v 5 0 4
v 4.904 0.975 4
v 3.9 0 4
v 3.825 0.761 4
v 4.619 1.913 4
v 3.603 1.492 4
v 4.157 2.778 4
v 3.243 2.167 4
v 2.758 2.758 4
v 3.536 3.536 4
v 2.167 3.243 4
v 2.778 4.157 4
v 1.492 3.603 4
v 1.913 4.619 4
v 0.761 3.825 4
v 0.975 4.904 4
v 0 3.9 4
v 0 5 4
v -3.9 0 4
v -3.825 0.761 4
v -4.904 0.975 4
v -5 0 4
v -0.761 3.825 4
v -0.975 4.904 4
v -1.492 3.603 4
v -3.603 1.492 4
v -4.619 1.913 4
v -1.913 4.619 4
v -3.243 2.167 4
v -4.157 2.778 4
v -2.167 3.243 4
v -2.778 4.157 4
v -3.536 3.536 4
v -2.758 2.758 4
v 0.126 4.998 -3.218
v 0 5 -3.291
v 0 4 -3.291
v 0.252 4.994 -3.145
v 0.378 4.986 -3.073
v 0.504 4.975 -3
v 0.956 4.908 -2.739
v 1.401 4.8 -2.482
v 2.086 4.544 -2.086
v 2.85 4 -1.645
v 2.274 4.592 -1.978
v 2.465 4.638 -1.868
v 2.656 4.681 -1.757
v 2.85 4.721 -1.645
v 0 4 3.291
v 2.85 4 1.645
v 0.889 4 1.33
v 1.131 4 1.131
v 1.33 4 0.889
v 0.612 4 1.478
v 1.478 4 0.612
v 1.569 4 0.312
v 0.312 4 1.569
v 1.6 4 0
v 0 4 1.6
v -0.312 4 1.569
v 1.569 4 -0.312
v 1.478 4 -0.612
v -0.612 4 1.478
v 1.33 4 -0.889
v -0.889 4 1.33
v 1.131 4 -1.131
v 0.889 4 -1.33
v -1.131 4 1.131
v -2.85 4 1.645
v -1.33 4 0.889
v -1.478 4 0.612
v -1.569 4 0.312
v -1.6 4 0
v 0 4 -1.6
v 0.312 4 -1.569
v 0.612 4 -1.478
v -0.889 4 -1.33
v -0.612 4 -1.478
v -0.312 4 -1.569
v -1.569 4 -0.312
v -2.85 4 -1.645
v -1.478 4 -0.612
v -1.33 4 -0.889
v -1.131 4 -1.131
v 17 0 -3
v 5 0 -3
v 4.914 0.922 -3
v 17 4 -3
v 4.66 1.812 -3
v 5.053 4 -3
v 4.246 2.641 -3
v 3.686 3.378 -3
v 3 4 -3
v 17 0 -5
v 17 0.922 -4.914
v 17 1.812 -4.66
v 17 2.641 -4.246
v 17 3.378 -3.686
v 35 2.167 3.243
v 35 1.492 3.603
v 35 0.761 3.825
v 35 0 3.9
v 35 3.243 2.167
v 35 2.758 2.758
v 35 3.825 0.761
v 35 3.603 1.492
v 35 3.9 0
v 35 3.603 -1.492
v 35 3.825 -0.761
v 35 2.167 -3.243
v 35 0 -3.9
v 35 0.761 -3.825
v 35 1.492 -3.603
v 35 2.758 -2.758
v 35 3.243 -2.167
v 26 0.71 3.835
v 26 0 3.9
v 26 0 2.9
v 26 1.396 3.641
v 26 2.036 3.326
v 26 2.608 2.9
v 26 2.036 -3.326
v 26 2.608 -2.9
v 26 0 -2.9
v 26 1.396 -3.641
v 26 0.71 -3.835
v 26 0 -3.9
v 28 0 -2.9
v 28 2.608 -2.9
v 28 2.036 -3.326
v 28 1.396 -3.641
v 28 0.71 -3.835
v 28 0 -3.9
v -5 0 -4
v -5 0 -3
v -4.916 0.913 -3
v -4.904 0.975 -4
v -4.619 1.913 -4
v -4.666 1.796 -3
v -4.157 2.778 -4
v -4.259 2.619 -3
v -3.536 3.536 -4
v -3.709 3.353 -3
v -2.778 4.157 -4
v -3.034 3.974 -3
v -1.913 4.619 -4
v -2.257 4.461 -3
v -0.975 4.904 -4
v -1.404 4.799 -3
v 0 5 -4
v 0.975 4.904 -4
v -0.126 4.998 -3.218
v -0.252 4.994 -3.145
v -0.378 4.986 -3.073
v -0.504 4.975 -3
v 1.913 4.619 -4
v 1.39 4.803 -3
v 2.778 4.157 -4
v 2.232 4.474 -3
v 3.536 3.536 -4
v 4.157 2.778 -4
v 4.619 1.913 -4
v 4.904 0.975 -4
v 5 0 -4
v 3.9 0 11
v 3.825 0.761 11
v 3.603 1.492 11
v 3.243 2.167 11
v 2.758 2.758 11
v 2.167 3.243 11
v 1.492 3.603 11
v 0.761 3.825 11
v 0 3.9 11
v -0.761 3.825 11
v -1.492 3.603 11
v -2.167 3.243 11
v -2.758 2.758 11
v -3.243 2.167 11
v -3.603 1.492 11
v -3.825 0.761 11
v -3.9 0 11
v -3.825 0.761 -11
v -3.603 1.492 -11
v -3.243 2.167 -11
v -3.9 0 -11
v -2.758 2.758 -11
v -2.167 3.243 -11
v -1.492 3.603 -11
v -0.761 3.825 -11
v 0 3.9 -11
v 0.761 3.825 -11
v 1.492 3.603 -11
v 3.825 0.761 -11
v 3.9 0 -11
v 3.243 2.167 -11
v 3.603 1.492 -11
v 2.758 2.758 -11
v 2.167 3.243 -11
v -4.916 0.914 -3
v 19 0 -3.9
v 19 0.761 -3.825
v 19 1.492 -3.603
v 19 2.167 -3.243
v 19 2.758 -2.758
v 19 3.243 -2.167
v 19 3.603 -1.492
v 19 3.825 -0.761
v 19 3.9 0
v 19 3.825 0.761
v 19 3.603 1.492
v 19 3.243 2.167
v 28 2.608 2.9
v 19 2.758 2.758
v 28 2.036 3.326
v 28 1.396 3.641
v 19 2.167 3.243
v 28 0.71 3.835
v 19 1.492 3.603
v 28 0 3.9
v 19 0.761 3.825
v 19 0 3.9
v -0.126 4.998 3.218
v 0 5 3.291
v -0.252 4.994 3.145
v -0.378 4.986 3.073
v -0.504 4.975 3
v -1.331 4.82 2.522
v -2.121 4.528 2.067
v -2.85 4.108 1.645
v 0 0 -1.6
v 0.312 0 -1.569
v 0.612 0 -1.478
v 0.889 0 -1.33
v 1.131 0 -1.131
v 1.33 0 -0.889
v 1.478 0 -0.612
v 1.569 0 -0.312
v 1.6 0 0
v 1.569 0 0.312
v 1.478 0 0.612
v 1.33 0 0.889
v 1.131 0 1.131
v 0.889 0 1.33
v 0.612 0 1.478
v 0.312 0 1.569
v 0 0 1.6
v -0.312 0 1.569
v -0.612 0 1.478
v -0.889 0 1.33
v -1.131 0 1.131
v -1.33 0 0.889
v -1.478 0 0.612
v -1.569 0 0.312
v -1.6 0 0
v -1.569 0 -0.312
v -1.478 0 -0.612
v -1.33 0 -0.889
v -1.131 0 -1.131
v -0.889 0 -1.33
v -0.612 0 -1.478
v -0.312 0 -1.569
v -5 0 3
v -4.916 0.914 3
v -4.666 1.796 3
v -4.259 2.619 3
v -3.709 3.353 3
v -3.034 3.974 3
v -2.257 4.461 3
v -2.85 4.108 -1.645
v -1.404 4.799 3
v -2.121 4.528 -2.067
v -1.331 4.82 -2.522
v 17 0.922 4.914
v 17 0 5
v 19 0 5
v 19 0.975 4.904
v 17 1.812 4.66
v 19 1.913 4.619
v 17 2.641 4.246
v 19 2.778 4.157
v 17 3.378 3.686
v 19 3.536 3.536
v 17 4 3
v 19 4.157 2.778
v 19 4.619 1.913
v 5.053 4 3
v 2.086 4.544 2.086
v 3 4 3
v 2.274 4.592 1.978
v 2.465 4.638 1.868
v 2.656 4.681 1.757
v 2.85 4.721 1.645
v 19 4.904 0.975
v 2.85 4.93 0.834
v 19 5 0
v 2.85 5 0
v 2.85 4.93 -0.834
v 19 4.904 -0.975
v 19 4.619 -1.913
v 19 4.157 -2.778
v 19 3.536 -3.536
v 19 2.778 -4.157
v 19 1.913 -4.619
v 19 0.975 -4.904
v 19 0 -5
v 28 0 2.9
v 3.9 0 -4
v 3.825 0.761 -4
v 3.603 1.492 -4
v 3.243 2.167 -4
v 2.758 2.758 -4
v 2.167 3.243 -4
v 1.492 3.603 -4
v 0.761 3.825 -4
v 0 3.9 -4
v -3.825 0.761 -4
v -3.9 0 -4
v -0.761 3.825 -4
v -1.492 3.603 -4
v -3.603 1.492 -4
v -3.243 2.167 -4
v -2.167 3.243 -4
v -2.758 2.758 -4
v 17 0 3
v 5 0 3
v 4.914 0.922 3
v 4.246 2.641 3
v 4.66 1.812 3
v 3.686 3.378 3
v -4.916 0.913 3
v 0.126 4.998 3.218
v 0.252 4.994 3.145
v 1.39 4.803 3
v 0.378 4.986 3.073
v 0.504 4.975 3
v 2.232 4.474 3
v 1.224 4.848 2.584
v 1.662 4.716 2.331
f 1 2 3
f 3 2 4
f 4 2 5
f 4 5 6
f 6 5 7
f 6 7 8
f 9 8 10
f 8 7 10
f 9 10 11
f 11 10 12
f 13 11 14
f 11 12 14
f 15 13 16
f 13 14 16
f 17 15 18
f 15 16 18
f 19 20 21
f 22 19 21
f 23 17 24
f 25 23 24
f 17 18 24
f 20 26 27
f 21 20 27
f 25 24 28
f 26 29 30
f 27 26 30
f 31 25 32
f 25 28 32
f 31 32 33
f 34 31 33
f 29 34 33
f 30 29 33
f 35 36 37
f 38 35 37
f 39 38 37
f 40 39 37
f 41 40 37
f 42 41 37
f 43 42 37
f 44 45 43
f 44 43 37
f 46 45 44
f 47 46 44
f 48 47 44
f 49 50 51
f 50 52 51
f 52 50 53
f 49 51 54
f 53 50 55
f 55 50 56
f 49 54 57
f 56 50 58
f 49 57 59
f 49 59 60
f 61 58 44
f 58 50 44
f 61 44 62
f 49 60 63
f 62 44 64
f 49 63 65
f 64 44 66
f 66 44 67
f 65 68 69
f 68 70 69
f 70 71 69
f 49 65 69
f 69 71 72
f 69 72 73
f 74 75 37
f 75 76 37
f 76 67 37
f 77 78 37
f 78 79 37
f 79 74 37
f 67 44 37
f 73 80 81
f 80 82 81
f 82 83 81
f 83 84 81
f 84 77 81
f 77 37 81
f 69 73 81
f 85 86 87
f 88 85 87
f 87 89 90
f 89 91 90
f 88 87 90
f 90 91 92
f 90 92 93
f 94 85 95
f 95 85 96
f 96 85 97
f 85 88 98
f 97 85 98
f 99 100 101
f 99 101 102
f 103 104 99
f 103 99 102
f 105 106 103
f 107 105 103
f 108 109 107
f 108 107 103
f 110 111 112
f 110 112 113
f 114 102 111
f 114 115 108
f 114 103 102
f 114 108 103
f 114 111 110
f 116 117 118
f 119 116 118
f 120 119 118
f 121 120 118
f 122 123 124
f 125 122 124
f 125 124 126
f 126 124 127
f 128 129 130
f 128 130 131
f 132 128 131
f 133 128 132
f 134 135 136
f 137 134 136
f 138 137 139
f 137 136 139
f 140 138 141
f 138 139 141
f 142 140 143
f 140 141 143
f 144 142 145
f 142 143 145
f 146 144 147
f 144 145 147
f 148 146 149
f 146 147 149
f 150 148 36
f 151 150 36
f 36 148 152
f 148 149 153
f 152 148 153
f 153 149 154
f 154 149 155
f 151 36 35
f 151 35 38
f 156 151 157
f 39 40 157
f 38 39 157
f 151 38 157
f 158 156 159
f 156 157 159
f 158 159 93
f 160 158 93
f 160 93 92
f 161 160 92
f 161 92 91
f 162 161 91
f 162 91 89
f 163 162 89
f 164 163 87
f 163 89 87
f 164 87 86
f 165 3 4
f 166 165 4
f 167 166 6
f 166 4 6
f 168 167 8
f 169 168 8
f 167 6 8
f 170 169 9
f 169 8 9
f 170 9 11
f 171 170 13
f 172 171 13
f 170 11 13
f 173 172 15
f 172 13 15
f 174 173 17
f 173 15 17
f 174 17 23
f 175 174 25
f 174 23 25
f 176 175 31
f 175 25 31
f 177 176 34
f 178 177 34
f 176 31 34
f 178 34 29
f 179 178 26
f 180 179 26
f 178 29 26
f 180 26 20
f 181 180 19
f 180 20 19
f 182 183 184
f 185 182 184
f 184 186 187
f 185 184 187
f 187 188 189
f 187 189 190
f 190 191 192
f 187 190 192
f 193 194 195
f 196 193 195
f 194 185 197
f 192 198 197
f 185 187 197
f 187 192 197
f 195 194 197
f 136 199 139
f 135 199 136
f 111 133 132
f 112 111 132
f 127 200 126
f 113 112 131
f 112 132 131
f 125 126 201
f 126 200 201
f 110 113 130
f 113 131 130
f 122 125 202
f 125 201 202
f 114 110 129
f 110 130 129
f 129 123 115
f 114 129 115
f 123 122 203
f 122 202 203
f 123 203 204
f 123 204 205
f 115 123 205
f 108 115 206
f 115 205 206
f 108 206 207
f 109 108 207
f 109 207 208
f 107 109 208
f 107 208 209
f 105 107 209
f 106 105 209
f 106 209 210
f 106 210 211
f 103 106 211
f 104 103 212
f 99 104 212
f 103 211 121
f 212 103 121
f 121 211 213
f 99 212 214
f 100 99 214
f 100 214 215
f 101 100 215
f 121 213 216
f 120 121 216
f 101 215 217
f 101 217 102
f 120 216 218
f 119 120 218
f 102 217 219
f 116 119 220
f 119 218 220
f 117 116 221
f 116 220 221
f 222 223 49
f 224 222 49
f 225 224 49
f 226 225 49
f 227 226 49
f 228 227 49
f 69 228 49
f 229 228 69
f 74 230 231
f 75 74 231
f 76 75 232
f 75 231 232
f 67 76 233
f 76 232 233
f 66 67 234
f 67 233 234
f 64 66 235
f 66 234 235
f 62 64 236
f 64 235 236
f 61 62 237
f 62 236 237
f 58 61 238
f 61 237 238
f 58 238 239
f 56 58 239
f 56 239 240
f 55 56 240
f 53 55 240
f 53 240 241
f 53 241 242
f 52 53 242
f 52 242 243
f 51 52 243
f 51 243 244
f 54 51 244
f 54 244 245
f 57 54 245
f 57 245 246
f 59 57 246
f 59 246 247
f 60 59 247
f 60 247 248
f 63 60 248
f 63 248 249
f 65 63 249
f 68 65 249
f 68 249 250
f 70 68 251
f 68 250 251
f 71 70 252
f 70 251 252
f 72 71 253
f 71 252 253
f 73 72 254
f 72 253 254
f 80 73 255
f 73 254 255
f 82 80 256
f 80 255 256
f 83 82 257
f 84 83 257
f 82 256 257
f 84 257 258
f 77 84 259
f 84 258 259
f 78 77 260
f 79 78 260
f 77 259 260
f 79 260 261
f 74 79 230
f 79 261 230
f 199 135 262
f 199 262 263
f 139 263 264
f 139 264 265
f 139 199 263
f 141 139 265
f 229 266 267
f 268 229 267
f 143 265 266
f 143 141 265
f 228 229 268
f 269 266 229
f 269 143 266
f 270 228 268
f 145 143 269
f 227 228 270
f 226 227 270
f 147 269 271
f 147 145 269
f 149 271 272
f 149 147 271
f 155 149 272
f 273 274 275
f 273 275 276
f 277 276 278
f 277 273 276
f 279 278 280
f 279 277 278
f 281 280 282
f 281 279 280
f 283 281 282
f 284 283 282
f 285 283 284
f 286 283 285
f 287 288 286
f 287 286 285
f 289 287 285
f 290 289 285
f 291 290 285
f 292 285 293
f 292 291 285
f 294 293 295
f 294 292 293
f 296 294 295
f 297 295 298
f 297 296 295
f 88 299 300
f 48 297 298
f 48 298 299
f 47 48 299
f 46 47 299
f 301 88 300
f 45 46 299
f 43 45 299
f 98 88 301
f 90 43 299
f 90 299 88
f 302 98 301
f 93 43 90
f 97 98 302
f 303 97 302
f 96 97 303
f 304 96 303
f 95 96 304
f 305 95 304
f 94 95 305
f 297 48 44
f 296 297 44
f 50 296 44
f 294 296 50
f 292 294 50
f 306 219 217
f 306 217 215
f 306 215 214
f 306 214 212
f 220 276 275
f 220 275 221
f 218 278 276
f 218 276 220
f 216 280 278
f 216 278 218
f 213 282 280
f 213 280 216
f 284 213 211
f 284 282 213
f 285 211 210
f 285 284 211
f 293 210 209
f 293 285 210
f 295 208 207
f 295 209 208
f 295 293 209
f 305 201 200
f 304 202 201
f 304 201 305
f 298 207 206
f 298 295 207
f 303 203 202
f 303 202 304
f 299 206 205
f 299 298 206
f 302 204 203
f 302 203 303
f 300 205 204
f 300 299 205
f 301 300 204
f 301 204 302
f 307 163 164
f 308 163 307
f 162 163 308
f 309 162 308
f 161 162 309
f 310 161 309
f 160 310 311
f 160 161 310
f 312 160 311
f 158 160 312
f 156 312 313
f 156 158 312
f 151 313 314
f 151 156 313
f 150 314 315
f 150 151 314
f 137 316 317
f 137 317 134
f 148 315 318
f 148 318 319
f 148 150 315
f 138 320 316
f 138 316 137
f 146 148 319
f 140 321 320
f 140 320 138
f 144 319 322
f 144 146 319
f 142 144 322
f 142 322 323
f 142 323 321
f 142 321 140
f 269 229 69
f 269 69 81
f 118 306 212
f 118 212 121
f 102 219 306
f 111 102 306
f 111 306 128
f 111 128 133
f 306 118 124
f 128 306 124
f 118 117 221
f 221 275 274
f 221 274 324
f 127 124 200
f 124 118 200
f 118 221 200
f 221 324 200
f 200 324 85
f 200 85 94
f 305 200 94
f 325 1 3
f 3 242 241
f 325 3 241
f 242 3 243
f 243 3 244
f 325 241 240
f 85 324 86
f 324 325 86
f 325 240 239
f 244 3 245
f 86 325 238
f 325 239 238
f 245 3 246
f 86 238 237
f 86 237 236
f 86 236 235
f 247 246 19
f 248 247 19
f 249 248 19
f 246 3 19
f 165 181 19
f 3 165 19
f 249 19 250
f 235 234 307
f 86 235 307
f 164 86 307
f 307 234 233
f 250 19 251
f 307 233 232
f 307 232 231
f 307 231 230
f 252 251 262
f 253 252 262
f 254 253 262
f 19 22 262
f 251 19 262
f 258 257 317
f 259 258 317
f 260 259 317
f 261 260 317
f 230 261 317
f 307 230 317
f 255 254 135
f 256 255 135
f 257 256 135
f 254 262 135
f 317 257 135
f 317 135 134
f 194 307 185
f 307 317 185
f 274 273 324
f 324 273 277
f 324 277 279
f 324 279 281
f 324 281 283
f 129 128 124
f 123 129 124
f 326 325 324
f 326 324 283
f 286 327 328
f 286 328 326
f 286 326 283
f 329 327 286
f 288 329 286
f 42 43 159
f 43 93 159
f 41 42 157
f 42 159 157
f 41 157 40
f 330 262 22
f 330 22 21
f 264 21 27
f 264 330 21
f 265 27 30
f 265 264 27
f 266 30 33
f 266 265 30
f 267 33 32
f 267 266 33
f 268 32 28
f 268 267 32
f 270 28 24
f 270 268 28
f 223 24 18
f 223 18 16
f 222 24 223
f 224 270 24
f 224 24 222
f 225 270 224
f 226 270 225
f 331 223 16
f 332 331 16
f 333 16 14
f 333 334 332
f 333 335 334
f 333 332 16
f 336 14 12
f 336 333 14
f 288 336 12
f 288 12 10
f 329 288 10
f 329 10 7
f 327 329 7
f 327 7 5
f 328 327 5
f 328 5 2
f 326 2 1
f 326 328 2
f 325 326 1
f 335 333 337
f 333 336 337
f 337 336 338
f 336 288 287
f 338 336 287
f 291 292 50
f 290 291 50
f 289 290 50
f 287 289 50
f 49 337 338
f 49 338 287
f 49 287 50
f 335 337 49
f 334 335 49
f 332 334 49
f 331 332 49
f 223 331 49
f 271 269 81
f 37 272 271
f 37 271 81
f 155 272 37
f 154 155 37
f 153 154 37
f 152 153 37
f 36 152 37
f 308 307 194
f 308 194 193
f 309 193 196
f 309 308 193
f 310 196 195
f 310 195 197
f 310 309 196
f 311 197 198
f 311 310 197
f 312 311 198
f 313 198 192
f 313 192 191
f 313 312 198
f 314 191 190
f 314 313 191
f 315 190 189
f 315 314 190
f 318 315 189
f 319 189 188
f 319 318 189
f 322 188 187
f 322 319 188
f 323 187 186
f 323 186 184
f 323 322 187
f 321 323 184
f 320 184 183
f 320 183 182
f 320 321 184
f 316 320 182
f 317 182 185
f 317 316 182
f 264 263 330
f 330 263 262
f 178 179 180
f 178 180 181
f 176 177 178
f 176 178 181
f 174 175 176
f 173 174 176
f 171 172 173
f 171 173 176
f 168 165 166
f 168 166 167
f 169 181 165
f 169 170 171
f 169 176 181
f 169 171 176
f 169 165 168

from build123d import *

# Parameters (mm, degrees)
SKETCH1_W           = 10
SKETCH1_H           = 6
BOSS_EXTRUDE1_DEPTH = 5
BOSS_EXTRUDE2_DEPTH = 1
BOSS_EXTRUDE3_DEPTH = 7
FILLET1_R           = 5
SKETCH4_W           = 6
SKETCH4_H           = 5
BOSS_EXTRUDE4_DEPTH = 12
SKETCH5_W           = 10
SKETCH5_H           = 5
BOSS_EXTRUDE5_DEPTH = 2
FILLET3_START       = 5.05342
FILLET3_DEPTH       = 13.94658
FILLET3_START_2     = 3
FILLET3_2_DEPTH     = 2.14658
FILLET3_3_DEPTH     = 3
FILLET3_START_3     = -3
FILLET3_4_DEPTH     = 6
BOSS_EXTRUDE6_DEPTH = 16
SKETCH7_R           = 1.6
SKETCH7_W           = 2
SKETCH7_H           = 1
CUT_EXTRUDE1_DEPTH  = 38.027017163
CUT_EXTRUDE6_DEPTH  = 1


with BuildPart() as part:
    # Sketch1 → Boss-Extrude1 (new body)
    with BuildSketch(Plane(origin=(0, 0, 0), x_dir=(1, 0, 0), z_dir=(0, 1, 0))):
        Rectangle(SKETCH1_W, SKETCH1_H)
    extrude(amount=BOSS_EXTRUDE1_DEPTH)

    # Sketch2 → Boss-Extrude2 (add)
    with BuildSketch(Plane.XY.offset(3)):
        with BuildLine():
            Line((5, 0), (-5, 0))
            ThreePointArc((-5, 0), (0, 5), (5, 0))
        make_face()
    boss_extrude2 = extrude(amount=BOSS_EXTRUDE2_DEPTH)

    # Sketch3 → Boss-Extrude3 (add)
    with BuildSketch(Plane.XY.offset(4)):
        with BuildLine():
            Line((-3.9, 0), (3.9, 0))
            ThreePointArc((3.9, 0), (0, 3.9), (-3.9, 0))
        make_face()
    boss_extrude3 = extrude(amount=BOSS_EXTRUDE3_DEPTH)

    # Mirror1: Boss-Extrude2, Boss-Extrude3 across plane
    add(boss_extrude2.mirror(Plane.XY))
    add(boss_extrude3.mirror(Plane.XY))

    # Fillet1
    fillet1_edges = [part.edges().sort_by_distance(p)[0] for p in [
        (-5, 5, 0),
    ]]
    fillet(fillet1_edges, radius=FILLET1_R - 0.0001)  # a hair under: the kernel refuses the full size

    # Sketch4 → Boss-Extrude4 (add)
    with BuildSketch(Plane(origin=(5, 0, 0), x_dir=(0, 0, -1), z_dir=(1, 0, 0))):
        with Locations((0, 2.5)):
            Rectangle(SKETCH4_W, SKETCH4_H)
    extrude(amount=BOSS_EXTRUDE4_DEPTH)

    # Sketch5 → Boss-Extrude5 (add)
    with BuildSketch(Plane(origin=(17, 0, 0), x_dir=(0, 0, -1), z_dir=(1, 0, 0))):
        with Locations((0, 2.5)):
            Rectangle(SKETCH5_W, SKETCH5_H)
    extrude(amount=BOSS_EXTRUDE5_DEPTH)

    # Fillet3: read off the stored shape, not the designer's step
    # Fillet3 outline → Fillet3 (cut)
    with BuildSketch(Plane.YZ.offset(FILLET3_START)):
        with BuildLine():
            ThreePointArc((5, 0), (3.535533906, -3.535533906), (0, -5))
            Line((0, -5), (5, -5))
            Line((5, -5), (5, 0))
        make_face()
        with BuildLine():
            Line((5, 0), (5, 5))
            Line((5, 5), (0, 5))
            ThreePointArc((0, 5), (3.535533906, 3.535533906), (5, 0))
        make_face()
    extrude(amount=FILLET3_DEPTH, mode=Mode.SUBTRACT)

    # Fillet3 2 outline → Fillet3 2 (cut)
    with BuildSketch(Plane.YZ.offset(FILLET3_START_2)):
        with BuildLine():
            Line((5, -3), (5, 0))
            ThreePointArc((5, 0), (4.74341649, -1.58113883), (4, -3))
            Line((4, -3), (5, -3))
        make_face()
        with BuildLine():
            ThreePointArc((4, 3), (4.74341649, 1.58113883), (5, 0))
            Line((5, 0), (5, 3))
            Line((5, 3), (4, 3))
        make_face()
    extrude(amount=FILLET3_2_DEPTH, mode=Mode.SUBTRACT)

    # Fillet3 3 outline → Fillet3 3 (cut)
    with BuildSketch(Plane.YZ):
        with BuildLine():
            Line((5, -3), (5, 0))
            ThreePointArc((5, 0), (4.74341649, -1.58113883), (4, -3))
            Line((4, -3), (5, -3))
        make_face()
        with BuildLine():
            ThreePointArc((4, 3), (4.74341649, 1.58113883), (5, 0))
            Line((5, 0), (5, 3))
            Line((5, 3), (4, 3))
        make_face()
    extrude(amount=FILLET3_3_DEPTH, mode=Mode.SUBTRACT)

    # Fillet3 4 outline → Fillet3 4 (add)
    with BuildSketch(Plane.XY.offset(FILLET3_START_3)):
        with BuildLine():
            ThreePointArc((3, 4), (1.58113883, 4.74341649), (0, 5))
            ThreePointArc((0, 5), (-0.50254481, 4.974680765), (-1, 4.898979485))
            Line((-1, 4.898979485), (-1, 2))
            Line((-1, 2), (4, 2))
            Line((4, 2), (4, 3.25))
            Line((4, 3.25), (3, 4))
        make_face()
    extrude(amount=FILLET3_4_DEPTH)

    # Sketch6 → Boss-Extrude6 (add)
    with BuildSketch(Plane(origin=(19, 0, 0), x_dir=(0, 0, -1), z_dir=(1, 0, 0))):
        with BuildLine():
            Line((-3.9, 0), (3.9, 0))
            ThreePointArc((3.9, 0), (0, 3.9), (-3.9, 0))
        make_face()
    extrude(amount=BOSS_EXTRUDE6_DEPTH)

    # Sketch7 → Cut-Extrude1 (cut, through all)
    with BuildSketch(Plane(origin=(0, 0, 0), x_dir=(-1, 0, 0), z_dir=(0, -1, 0))):
        with Locations(Location((0, 0, 0), (0, 0, 90))):
            Circle(SKETCH7_R)
        with Locations((-27, -3.4)):
            Rectangle(SKETCH7_W, SKETCH7_H)
        with Locations((-27, 3.4)):
            Rectangle(SKETCH7_W, SKETCH7_H)
    extrude(amount=-CUT_EXTRUDE1_DEPTH, mode=Mode.SUBTRACT)

    # Sketch9 → Cut-Extrude6 (cut)
    with BuildSketch(Plane(origin=(0, 5, 0), x_dir=(-1, 0, 0), z_dir=(0, -1, 0))):
        Polygon((-2.85, 1.645448267), (-2.85, -1.645448267), (0, -3.290896534), (2.85, -1.645448267), (2.85, 1.645448267), (0, 3.290896534), align=None)
    extrude(amount=CUT_EXTRUDE6_DEPTH, mode=Mode.SUBTRACT)


solid = part.part
